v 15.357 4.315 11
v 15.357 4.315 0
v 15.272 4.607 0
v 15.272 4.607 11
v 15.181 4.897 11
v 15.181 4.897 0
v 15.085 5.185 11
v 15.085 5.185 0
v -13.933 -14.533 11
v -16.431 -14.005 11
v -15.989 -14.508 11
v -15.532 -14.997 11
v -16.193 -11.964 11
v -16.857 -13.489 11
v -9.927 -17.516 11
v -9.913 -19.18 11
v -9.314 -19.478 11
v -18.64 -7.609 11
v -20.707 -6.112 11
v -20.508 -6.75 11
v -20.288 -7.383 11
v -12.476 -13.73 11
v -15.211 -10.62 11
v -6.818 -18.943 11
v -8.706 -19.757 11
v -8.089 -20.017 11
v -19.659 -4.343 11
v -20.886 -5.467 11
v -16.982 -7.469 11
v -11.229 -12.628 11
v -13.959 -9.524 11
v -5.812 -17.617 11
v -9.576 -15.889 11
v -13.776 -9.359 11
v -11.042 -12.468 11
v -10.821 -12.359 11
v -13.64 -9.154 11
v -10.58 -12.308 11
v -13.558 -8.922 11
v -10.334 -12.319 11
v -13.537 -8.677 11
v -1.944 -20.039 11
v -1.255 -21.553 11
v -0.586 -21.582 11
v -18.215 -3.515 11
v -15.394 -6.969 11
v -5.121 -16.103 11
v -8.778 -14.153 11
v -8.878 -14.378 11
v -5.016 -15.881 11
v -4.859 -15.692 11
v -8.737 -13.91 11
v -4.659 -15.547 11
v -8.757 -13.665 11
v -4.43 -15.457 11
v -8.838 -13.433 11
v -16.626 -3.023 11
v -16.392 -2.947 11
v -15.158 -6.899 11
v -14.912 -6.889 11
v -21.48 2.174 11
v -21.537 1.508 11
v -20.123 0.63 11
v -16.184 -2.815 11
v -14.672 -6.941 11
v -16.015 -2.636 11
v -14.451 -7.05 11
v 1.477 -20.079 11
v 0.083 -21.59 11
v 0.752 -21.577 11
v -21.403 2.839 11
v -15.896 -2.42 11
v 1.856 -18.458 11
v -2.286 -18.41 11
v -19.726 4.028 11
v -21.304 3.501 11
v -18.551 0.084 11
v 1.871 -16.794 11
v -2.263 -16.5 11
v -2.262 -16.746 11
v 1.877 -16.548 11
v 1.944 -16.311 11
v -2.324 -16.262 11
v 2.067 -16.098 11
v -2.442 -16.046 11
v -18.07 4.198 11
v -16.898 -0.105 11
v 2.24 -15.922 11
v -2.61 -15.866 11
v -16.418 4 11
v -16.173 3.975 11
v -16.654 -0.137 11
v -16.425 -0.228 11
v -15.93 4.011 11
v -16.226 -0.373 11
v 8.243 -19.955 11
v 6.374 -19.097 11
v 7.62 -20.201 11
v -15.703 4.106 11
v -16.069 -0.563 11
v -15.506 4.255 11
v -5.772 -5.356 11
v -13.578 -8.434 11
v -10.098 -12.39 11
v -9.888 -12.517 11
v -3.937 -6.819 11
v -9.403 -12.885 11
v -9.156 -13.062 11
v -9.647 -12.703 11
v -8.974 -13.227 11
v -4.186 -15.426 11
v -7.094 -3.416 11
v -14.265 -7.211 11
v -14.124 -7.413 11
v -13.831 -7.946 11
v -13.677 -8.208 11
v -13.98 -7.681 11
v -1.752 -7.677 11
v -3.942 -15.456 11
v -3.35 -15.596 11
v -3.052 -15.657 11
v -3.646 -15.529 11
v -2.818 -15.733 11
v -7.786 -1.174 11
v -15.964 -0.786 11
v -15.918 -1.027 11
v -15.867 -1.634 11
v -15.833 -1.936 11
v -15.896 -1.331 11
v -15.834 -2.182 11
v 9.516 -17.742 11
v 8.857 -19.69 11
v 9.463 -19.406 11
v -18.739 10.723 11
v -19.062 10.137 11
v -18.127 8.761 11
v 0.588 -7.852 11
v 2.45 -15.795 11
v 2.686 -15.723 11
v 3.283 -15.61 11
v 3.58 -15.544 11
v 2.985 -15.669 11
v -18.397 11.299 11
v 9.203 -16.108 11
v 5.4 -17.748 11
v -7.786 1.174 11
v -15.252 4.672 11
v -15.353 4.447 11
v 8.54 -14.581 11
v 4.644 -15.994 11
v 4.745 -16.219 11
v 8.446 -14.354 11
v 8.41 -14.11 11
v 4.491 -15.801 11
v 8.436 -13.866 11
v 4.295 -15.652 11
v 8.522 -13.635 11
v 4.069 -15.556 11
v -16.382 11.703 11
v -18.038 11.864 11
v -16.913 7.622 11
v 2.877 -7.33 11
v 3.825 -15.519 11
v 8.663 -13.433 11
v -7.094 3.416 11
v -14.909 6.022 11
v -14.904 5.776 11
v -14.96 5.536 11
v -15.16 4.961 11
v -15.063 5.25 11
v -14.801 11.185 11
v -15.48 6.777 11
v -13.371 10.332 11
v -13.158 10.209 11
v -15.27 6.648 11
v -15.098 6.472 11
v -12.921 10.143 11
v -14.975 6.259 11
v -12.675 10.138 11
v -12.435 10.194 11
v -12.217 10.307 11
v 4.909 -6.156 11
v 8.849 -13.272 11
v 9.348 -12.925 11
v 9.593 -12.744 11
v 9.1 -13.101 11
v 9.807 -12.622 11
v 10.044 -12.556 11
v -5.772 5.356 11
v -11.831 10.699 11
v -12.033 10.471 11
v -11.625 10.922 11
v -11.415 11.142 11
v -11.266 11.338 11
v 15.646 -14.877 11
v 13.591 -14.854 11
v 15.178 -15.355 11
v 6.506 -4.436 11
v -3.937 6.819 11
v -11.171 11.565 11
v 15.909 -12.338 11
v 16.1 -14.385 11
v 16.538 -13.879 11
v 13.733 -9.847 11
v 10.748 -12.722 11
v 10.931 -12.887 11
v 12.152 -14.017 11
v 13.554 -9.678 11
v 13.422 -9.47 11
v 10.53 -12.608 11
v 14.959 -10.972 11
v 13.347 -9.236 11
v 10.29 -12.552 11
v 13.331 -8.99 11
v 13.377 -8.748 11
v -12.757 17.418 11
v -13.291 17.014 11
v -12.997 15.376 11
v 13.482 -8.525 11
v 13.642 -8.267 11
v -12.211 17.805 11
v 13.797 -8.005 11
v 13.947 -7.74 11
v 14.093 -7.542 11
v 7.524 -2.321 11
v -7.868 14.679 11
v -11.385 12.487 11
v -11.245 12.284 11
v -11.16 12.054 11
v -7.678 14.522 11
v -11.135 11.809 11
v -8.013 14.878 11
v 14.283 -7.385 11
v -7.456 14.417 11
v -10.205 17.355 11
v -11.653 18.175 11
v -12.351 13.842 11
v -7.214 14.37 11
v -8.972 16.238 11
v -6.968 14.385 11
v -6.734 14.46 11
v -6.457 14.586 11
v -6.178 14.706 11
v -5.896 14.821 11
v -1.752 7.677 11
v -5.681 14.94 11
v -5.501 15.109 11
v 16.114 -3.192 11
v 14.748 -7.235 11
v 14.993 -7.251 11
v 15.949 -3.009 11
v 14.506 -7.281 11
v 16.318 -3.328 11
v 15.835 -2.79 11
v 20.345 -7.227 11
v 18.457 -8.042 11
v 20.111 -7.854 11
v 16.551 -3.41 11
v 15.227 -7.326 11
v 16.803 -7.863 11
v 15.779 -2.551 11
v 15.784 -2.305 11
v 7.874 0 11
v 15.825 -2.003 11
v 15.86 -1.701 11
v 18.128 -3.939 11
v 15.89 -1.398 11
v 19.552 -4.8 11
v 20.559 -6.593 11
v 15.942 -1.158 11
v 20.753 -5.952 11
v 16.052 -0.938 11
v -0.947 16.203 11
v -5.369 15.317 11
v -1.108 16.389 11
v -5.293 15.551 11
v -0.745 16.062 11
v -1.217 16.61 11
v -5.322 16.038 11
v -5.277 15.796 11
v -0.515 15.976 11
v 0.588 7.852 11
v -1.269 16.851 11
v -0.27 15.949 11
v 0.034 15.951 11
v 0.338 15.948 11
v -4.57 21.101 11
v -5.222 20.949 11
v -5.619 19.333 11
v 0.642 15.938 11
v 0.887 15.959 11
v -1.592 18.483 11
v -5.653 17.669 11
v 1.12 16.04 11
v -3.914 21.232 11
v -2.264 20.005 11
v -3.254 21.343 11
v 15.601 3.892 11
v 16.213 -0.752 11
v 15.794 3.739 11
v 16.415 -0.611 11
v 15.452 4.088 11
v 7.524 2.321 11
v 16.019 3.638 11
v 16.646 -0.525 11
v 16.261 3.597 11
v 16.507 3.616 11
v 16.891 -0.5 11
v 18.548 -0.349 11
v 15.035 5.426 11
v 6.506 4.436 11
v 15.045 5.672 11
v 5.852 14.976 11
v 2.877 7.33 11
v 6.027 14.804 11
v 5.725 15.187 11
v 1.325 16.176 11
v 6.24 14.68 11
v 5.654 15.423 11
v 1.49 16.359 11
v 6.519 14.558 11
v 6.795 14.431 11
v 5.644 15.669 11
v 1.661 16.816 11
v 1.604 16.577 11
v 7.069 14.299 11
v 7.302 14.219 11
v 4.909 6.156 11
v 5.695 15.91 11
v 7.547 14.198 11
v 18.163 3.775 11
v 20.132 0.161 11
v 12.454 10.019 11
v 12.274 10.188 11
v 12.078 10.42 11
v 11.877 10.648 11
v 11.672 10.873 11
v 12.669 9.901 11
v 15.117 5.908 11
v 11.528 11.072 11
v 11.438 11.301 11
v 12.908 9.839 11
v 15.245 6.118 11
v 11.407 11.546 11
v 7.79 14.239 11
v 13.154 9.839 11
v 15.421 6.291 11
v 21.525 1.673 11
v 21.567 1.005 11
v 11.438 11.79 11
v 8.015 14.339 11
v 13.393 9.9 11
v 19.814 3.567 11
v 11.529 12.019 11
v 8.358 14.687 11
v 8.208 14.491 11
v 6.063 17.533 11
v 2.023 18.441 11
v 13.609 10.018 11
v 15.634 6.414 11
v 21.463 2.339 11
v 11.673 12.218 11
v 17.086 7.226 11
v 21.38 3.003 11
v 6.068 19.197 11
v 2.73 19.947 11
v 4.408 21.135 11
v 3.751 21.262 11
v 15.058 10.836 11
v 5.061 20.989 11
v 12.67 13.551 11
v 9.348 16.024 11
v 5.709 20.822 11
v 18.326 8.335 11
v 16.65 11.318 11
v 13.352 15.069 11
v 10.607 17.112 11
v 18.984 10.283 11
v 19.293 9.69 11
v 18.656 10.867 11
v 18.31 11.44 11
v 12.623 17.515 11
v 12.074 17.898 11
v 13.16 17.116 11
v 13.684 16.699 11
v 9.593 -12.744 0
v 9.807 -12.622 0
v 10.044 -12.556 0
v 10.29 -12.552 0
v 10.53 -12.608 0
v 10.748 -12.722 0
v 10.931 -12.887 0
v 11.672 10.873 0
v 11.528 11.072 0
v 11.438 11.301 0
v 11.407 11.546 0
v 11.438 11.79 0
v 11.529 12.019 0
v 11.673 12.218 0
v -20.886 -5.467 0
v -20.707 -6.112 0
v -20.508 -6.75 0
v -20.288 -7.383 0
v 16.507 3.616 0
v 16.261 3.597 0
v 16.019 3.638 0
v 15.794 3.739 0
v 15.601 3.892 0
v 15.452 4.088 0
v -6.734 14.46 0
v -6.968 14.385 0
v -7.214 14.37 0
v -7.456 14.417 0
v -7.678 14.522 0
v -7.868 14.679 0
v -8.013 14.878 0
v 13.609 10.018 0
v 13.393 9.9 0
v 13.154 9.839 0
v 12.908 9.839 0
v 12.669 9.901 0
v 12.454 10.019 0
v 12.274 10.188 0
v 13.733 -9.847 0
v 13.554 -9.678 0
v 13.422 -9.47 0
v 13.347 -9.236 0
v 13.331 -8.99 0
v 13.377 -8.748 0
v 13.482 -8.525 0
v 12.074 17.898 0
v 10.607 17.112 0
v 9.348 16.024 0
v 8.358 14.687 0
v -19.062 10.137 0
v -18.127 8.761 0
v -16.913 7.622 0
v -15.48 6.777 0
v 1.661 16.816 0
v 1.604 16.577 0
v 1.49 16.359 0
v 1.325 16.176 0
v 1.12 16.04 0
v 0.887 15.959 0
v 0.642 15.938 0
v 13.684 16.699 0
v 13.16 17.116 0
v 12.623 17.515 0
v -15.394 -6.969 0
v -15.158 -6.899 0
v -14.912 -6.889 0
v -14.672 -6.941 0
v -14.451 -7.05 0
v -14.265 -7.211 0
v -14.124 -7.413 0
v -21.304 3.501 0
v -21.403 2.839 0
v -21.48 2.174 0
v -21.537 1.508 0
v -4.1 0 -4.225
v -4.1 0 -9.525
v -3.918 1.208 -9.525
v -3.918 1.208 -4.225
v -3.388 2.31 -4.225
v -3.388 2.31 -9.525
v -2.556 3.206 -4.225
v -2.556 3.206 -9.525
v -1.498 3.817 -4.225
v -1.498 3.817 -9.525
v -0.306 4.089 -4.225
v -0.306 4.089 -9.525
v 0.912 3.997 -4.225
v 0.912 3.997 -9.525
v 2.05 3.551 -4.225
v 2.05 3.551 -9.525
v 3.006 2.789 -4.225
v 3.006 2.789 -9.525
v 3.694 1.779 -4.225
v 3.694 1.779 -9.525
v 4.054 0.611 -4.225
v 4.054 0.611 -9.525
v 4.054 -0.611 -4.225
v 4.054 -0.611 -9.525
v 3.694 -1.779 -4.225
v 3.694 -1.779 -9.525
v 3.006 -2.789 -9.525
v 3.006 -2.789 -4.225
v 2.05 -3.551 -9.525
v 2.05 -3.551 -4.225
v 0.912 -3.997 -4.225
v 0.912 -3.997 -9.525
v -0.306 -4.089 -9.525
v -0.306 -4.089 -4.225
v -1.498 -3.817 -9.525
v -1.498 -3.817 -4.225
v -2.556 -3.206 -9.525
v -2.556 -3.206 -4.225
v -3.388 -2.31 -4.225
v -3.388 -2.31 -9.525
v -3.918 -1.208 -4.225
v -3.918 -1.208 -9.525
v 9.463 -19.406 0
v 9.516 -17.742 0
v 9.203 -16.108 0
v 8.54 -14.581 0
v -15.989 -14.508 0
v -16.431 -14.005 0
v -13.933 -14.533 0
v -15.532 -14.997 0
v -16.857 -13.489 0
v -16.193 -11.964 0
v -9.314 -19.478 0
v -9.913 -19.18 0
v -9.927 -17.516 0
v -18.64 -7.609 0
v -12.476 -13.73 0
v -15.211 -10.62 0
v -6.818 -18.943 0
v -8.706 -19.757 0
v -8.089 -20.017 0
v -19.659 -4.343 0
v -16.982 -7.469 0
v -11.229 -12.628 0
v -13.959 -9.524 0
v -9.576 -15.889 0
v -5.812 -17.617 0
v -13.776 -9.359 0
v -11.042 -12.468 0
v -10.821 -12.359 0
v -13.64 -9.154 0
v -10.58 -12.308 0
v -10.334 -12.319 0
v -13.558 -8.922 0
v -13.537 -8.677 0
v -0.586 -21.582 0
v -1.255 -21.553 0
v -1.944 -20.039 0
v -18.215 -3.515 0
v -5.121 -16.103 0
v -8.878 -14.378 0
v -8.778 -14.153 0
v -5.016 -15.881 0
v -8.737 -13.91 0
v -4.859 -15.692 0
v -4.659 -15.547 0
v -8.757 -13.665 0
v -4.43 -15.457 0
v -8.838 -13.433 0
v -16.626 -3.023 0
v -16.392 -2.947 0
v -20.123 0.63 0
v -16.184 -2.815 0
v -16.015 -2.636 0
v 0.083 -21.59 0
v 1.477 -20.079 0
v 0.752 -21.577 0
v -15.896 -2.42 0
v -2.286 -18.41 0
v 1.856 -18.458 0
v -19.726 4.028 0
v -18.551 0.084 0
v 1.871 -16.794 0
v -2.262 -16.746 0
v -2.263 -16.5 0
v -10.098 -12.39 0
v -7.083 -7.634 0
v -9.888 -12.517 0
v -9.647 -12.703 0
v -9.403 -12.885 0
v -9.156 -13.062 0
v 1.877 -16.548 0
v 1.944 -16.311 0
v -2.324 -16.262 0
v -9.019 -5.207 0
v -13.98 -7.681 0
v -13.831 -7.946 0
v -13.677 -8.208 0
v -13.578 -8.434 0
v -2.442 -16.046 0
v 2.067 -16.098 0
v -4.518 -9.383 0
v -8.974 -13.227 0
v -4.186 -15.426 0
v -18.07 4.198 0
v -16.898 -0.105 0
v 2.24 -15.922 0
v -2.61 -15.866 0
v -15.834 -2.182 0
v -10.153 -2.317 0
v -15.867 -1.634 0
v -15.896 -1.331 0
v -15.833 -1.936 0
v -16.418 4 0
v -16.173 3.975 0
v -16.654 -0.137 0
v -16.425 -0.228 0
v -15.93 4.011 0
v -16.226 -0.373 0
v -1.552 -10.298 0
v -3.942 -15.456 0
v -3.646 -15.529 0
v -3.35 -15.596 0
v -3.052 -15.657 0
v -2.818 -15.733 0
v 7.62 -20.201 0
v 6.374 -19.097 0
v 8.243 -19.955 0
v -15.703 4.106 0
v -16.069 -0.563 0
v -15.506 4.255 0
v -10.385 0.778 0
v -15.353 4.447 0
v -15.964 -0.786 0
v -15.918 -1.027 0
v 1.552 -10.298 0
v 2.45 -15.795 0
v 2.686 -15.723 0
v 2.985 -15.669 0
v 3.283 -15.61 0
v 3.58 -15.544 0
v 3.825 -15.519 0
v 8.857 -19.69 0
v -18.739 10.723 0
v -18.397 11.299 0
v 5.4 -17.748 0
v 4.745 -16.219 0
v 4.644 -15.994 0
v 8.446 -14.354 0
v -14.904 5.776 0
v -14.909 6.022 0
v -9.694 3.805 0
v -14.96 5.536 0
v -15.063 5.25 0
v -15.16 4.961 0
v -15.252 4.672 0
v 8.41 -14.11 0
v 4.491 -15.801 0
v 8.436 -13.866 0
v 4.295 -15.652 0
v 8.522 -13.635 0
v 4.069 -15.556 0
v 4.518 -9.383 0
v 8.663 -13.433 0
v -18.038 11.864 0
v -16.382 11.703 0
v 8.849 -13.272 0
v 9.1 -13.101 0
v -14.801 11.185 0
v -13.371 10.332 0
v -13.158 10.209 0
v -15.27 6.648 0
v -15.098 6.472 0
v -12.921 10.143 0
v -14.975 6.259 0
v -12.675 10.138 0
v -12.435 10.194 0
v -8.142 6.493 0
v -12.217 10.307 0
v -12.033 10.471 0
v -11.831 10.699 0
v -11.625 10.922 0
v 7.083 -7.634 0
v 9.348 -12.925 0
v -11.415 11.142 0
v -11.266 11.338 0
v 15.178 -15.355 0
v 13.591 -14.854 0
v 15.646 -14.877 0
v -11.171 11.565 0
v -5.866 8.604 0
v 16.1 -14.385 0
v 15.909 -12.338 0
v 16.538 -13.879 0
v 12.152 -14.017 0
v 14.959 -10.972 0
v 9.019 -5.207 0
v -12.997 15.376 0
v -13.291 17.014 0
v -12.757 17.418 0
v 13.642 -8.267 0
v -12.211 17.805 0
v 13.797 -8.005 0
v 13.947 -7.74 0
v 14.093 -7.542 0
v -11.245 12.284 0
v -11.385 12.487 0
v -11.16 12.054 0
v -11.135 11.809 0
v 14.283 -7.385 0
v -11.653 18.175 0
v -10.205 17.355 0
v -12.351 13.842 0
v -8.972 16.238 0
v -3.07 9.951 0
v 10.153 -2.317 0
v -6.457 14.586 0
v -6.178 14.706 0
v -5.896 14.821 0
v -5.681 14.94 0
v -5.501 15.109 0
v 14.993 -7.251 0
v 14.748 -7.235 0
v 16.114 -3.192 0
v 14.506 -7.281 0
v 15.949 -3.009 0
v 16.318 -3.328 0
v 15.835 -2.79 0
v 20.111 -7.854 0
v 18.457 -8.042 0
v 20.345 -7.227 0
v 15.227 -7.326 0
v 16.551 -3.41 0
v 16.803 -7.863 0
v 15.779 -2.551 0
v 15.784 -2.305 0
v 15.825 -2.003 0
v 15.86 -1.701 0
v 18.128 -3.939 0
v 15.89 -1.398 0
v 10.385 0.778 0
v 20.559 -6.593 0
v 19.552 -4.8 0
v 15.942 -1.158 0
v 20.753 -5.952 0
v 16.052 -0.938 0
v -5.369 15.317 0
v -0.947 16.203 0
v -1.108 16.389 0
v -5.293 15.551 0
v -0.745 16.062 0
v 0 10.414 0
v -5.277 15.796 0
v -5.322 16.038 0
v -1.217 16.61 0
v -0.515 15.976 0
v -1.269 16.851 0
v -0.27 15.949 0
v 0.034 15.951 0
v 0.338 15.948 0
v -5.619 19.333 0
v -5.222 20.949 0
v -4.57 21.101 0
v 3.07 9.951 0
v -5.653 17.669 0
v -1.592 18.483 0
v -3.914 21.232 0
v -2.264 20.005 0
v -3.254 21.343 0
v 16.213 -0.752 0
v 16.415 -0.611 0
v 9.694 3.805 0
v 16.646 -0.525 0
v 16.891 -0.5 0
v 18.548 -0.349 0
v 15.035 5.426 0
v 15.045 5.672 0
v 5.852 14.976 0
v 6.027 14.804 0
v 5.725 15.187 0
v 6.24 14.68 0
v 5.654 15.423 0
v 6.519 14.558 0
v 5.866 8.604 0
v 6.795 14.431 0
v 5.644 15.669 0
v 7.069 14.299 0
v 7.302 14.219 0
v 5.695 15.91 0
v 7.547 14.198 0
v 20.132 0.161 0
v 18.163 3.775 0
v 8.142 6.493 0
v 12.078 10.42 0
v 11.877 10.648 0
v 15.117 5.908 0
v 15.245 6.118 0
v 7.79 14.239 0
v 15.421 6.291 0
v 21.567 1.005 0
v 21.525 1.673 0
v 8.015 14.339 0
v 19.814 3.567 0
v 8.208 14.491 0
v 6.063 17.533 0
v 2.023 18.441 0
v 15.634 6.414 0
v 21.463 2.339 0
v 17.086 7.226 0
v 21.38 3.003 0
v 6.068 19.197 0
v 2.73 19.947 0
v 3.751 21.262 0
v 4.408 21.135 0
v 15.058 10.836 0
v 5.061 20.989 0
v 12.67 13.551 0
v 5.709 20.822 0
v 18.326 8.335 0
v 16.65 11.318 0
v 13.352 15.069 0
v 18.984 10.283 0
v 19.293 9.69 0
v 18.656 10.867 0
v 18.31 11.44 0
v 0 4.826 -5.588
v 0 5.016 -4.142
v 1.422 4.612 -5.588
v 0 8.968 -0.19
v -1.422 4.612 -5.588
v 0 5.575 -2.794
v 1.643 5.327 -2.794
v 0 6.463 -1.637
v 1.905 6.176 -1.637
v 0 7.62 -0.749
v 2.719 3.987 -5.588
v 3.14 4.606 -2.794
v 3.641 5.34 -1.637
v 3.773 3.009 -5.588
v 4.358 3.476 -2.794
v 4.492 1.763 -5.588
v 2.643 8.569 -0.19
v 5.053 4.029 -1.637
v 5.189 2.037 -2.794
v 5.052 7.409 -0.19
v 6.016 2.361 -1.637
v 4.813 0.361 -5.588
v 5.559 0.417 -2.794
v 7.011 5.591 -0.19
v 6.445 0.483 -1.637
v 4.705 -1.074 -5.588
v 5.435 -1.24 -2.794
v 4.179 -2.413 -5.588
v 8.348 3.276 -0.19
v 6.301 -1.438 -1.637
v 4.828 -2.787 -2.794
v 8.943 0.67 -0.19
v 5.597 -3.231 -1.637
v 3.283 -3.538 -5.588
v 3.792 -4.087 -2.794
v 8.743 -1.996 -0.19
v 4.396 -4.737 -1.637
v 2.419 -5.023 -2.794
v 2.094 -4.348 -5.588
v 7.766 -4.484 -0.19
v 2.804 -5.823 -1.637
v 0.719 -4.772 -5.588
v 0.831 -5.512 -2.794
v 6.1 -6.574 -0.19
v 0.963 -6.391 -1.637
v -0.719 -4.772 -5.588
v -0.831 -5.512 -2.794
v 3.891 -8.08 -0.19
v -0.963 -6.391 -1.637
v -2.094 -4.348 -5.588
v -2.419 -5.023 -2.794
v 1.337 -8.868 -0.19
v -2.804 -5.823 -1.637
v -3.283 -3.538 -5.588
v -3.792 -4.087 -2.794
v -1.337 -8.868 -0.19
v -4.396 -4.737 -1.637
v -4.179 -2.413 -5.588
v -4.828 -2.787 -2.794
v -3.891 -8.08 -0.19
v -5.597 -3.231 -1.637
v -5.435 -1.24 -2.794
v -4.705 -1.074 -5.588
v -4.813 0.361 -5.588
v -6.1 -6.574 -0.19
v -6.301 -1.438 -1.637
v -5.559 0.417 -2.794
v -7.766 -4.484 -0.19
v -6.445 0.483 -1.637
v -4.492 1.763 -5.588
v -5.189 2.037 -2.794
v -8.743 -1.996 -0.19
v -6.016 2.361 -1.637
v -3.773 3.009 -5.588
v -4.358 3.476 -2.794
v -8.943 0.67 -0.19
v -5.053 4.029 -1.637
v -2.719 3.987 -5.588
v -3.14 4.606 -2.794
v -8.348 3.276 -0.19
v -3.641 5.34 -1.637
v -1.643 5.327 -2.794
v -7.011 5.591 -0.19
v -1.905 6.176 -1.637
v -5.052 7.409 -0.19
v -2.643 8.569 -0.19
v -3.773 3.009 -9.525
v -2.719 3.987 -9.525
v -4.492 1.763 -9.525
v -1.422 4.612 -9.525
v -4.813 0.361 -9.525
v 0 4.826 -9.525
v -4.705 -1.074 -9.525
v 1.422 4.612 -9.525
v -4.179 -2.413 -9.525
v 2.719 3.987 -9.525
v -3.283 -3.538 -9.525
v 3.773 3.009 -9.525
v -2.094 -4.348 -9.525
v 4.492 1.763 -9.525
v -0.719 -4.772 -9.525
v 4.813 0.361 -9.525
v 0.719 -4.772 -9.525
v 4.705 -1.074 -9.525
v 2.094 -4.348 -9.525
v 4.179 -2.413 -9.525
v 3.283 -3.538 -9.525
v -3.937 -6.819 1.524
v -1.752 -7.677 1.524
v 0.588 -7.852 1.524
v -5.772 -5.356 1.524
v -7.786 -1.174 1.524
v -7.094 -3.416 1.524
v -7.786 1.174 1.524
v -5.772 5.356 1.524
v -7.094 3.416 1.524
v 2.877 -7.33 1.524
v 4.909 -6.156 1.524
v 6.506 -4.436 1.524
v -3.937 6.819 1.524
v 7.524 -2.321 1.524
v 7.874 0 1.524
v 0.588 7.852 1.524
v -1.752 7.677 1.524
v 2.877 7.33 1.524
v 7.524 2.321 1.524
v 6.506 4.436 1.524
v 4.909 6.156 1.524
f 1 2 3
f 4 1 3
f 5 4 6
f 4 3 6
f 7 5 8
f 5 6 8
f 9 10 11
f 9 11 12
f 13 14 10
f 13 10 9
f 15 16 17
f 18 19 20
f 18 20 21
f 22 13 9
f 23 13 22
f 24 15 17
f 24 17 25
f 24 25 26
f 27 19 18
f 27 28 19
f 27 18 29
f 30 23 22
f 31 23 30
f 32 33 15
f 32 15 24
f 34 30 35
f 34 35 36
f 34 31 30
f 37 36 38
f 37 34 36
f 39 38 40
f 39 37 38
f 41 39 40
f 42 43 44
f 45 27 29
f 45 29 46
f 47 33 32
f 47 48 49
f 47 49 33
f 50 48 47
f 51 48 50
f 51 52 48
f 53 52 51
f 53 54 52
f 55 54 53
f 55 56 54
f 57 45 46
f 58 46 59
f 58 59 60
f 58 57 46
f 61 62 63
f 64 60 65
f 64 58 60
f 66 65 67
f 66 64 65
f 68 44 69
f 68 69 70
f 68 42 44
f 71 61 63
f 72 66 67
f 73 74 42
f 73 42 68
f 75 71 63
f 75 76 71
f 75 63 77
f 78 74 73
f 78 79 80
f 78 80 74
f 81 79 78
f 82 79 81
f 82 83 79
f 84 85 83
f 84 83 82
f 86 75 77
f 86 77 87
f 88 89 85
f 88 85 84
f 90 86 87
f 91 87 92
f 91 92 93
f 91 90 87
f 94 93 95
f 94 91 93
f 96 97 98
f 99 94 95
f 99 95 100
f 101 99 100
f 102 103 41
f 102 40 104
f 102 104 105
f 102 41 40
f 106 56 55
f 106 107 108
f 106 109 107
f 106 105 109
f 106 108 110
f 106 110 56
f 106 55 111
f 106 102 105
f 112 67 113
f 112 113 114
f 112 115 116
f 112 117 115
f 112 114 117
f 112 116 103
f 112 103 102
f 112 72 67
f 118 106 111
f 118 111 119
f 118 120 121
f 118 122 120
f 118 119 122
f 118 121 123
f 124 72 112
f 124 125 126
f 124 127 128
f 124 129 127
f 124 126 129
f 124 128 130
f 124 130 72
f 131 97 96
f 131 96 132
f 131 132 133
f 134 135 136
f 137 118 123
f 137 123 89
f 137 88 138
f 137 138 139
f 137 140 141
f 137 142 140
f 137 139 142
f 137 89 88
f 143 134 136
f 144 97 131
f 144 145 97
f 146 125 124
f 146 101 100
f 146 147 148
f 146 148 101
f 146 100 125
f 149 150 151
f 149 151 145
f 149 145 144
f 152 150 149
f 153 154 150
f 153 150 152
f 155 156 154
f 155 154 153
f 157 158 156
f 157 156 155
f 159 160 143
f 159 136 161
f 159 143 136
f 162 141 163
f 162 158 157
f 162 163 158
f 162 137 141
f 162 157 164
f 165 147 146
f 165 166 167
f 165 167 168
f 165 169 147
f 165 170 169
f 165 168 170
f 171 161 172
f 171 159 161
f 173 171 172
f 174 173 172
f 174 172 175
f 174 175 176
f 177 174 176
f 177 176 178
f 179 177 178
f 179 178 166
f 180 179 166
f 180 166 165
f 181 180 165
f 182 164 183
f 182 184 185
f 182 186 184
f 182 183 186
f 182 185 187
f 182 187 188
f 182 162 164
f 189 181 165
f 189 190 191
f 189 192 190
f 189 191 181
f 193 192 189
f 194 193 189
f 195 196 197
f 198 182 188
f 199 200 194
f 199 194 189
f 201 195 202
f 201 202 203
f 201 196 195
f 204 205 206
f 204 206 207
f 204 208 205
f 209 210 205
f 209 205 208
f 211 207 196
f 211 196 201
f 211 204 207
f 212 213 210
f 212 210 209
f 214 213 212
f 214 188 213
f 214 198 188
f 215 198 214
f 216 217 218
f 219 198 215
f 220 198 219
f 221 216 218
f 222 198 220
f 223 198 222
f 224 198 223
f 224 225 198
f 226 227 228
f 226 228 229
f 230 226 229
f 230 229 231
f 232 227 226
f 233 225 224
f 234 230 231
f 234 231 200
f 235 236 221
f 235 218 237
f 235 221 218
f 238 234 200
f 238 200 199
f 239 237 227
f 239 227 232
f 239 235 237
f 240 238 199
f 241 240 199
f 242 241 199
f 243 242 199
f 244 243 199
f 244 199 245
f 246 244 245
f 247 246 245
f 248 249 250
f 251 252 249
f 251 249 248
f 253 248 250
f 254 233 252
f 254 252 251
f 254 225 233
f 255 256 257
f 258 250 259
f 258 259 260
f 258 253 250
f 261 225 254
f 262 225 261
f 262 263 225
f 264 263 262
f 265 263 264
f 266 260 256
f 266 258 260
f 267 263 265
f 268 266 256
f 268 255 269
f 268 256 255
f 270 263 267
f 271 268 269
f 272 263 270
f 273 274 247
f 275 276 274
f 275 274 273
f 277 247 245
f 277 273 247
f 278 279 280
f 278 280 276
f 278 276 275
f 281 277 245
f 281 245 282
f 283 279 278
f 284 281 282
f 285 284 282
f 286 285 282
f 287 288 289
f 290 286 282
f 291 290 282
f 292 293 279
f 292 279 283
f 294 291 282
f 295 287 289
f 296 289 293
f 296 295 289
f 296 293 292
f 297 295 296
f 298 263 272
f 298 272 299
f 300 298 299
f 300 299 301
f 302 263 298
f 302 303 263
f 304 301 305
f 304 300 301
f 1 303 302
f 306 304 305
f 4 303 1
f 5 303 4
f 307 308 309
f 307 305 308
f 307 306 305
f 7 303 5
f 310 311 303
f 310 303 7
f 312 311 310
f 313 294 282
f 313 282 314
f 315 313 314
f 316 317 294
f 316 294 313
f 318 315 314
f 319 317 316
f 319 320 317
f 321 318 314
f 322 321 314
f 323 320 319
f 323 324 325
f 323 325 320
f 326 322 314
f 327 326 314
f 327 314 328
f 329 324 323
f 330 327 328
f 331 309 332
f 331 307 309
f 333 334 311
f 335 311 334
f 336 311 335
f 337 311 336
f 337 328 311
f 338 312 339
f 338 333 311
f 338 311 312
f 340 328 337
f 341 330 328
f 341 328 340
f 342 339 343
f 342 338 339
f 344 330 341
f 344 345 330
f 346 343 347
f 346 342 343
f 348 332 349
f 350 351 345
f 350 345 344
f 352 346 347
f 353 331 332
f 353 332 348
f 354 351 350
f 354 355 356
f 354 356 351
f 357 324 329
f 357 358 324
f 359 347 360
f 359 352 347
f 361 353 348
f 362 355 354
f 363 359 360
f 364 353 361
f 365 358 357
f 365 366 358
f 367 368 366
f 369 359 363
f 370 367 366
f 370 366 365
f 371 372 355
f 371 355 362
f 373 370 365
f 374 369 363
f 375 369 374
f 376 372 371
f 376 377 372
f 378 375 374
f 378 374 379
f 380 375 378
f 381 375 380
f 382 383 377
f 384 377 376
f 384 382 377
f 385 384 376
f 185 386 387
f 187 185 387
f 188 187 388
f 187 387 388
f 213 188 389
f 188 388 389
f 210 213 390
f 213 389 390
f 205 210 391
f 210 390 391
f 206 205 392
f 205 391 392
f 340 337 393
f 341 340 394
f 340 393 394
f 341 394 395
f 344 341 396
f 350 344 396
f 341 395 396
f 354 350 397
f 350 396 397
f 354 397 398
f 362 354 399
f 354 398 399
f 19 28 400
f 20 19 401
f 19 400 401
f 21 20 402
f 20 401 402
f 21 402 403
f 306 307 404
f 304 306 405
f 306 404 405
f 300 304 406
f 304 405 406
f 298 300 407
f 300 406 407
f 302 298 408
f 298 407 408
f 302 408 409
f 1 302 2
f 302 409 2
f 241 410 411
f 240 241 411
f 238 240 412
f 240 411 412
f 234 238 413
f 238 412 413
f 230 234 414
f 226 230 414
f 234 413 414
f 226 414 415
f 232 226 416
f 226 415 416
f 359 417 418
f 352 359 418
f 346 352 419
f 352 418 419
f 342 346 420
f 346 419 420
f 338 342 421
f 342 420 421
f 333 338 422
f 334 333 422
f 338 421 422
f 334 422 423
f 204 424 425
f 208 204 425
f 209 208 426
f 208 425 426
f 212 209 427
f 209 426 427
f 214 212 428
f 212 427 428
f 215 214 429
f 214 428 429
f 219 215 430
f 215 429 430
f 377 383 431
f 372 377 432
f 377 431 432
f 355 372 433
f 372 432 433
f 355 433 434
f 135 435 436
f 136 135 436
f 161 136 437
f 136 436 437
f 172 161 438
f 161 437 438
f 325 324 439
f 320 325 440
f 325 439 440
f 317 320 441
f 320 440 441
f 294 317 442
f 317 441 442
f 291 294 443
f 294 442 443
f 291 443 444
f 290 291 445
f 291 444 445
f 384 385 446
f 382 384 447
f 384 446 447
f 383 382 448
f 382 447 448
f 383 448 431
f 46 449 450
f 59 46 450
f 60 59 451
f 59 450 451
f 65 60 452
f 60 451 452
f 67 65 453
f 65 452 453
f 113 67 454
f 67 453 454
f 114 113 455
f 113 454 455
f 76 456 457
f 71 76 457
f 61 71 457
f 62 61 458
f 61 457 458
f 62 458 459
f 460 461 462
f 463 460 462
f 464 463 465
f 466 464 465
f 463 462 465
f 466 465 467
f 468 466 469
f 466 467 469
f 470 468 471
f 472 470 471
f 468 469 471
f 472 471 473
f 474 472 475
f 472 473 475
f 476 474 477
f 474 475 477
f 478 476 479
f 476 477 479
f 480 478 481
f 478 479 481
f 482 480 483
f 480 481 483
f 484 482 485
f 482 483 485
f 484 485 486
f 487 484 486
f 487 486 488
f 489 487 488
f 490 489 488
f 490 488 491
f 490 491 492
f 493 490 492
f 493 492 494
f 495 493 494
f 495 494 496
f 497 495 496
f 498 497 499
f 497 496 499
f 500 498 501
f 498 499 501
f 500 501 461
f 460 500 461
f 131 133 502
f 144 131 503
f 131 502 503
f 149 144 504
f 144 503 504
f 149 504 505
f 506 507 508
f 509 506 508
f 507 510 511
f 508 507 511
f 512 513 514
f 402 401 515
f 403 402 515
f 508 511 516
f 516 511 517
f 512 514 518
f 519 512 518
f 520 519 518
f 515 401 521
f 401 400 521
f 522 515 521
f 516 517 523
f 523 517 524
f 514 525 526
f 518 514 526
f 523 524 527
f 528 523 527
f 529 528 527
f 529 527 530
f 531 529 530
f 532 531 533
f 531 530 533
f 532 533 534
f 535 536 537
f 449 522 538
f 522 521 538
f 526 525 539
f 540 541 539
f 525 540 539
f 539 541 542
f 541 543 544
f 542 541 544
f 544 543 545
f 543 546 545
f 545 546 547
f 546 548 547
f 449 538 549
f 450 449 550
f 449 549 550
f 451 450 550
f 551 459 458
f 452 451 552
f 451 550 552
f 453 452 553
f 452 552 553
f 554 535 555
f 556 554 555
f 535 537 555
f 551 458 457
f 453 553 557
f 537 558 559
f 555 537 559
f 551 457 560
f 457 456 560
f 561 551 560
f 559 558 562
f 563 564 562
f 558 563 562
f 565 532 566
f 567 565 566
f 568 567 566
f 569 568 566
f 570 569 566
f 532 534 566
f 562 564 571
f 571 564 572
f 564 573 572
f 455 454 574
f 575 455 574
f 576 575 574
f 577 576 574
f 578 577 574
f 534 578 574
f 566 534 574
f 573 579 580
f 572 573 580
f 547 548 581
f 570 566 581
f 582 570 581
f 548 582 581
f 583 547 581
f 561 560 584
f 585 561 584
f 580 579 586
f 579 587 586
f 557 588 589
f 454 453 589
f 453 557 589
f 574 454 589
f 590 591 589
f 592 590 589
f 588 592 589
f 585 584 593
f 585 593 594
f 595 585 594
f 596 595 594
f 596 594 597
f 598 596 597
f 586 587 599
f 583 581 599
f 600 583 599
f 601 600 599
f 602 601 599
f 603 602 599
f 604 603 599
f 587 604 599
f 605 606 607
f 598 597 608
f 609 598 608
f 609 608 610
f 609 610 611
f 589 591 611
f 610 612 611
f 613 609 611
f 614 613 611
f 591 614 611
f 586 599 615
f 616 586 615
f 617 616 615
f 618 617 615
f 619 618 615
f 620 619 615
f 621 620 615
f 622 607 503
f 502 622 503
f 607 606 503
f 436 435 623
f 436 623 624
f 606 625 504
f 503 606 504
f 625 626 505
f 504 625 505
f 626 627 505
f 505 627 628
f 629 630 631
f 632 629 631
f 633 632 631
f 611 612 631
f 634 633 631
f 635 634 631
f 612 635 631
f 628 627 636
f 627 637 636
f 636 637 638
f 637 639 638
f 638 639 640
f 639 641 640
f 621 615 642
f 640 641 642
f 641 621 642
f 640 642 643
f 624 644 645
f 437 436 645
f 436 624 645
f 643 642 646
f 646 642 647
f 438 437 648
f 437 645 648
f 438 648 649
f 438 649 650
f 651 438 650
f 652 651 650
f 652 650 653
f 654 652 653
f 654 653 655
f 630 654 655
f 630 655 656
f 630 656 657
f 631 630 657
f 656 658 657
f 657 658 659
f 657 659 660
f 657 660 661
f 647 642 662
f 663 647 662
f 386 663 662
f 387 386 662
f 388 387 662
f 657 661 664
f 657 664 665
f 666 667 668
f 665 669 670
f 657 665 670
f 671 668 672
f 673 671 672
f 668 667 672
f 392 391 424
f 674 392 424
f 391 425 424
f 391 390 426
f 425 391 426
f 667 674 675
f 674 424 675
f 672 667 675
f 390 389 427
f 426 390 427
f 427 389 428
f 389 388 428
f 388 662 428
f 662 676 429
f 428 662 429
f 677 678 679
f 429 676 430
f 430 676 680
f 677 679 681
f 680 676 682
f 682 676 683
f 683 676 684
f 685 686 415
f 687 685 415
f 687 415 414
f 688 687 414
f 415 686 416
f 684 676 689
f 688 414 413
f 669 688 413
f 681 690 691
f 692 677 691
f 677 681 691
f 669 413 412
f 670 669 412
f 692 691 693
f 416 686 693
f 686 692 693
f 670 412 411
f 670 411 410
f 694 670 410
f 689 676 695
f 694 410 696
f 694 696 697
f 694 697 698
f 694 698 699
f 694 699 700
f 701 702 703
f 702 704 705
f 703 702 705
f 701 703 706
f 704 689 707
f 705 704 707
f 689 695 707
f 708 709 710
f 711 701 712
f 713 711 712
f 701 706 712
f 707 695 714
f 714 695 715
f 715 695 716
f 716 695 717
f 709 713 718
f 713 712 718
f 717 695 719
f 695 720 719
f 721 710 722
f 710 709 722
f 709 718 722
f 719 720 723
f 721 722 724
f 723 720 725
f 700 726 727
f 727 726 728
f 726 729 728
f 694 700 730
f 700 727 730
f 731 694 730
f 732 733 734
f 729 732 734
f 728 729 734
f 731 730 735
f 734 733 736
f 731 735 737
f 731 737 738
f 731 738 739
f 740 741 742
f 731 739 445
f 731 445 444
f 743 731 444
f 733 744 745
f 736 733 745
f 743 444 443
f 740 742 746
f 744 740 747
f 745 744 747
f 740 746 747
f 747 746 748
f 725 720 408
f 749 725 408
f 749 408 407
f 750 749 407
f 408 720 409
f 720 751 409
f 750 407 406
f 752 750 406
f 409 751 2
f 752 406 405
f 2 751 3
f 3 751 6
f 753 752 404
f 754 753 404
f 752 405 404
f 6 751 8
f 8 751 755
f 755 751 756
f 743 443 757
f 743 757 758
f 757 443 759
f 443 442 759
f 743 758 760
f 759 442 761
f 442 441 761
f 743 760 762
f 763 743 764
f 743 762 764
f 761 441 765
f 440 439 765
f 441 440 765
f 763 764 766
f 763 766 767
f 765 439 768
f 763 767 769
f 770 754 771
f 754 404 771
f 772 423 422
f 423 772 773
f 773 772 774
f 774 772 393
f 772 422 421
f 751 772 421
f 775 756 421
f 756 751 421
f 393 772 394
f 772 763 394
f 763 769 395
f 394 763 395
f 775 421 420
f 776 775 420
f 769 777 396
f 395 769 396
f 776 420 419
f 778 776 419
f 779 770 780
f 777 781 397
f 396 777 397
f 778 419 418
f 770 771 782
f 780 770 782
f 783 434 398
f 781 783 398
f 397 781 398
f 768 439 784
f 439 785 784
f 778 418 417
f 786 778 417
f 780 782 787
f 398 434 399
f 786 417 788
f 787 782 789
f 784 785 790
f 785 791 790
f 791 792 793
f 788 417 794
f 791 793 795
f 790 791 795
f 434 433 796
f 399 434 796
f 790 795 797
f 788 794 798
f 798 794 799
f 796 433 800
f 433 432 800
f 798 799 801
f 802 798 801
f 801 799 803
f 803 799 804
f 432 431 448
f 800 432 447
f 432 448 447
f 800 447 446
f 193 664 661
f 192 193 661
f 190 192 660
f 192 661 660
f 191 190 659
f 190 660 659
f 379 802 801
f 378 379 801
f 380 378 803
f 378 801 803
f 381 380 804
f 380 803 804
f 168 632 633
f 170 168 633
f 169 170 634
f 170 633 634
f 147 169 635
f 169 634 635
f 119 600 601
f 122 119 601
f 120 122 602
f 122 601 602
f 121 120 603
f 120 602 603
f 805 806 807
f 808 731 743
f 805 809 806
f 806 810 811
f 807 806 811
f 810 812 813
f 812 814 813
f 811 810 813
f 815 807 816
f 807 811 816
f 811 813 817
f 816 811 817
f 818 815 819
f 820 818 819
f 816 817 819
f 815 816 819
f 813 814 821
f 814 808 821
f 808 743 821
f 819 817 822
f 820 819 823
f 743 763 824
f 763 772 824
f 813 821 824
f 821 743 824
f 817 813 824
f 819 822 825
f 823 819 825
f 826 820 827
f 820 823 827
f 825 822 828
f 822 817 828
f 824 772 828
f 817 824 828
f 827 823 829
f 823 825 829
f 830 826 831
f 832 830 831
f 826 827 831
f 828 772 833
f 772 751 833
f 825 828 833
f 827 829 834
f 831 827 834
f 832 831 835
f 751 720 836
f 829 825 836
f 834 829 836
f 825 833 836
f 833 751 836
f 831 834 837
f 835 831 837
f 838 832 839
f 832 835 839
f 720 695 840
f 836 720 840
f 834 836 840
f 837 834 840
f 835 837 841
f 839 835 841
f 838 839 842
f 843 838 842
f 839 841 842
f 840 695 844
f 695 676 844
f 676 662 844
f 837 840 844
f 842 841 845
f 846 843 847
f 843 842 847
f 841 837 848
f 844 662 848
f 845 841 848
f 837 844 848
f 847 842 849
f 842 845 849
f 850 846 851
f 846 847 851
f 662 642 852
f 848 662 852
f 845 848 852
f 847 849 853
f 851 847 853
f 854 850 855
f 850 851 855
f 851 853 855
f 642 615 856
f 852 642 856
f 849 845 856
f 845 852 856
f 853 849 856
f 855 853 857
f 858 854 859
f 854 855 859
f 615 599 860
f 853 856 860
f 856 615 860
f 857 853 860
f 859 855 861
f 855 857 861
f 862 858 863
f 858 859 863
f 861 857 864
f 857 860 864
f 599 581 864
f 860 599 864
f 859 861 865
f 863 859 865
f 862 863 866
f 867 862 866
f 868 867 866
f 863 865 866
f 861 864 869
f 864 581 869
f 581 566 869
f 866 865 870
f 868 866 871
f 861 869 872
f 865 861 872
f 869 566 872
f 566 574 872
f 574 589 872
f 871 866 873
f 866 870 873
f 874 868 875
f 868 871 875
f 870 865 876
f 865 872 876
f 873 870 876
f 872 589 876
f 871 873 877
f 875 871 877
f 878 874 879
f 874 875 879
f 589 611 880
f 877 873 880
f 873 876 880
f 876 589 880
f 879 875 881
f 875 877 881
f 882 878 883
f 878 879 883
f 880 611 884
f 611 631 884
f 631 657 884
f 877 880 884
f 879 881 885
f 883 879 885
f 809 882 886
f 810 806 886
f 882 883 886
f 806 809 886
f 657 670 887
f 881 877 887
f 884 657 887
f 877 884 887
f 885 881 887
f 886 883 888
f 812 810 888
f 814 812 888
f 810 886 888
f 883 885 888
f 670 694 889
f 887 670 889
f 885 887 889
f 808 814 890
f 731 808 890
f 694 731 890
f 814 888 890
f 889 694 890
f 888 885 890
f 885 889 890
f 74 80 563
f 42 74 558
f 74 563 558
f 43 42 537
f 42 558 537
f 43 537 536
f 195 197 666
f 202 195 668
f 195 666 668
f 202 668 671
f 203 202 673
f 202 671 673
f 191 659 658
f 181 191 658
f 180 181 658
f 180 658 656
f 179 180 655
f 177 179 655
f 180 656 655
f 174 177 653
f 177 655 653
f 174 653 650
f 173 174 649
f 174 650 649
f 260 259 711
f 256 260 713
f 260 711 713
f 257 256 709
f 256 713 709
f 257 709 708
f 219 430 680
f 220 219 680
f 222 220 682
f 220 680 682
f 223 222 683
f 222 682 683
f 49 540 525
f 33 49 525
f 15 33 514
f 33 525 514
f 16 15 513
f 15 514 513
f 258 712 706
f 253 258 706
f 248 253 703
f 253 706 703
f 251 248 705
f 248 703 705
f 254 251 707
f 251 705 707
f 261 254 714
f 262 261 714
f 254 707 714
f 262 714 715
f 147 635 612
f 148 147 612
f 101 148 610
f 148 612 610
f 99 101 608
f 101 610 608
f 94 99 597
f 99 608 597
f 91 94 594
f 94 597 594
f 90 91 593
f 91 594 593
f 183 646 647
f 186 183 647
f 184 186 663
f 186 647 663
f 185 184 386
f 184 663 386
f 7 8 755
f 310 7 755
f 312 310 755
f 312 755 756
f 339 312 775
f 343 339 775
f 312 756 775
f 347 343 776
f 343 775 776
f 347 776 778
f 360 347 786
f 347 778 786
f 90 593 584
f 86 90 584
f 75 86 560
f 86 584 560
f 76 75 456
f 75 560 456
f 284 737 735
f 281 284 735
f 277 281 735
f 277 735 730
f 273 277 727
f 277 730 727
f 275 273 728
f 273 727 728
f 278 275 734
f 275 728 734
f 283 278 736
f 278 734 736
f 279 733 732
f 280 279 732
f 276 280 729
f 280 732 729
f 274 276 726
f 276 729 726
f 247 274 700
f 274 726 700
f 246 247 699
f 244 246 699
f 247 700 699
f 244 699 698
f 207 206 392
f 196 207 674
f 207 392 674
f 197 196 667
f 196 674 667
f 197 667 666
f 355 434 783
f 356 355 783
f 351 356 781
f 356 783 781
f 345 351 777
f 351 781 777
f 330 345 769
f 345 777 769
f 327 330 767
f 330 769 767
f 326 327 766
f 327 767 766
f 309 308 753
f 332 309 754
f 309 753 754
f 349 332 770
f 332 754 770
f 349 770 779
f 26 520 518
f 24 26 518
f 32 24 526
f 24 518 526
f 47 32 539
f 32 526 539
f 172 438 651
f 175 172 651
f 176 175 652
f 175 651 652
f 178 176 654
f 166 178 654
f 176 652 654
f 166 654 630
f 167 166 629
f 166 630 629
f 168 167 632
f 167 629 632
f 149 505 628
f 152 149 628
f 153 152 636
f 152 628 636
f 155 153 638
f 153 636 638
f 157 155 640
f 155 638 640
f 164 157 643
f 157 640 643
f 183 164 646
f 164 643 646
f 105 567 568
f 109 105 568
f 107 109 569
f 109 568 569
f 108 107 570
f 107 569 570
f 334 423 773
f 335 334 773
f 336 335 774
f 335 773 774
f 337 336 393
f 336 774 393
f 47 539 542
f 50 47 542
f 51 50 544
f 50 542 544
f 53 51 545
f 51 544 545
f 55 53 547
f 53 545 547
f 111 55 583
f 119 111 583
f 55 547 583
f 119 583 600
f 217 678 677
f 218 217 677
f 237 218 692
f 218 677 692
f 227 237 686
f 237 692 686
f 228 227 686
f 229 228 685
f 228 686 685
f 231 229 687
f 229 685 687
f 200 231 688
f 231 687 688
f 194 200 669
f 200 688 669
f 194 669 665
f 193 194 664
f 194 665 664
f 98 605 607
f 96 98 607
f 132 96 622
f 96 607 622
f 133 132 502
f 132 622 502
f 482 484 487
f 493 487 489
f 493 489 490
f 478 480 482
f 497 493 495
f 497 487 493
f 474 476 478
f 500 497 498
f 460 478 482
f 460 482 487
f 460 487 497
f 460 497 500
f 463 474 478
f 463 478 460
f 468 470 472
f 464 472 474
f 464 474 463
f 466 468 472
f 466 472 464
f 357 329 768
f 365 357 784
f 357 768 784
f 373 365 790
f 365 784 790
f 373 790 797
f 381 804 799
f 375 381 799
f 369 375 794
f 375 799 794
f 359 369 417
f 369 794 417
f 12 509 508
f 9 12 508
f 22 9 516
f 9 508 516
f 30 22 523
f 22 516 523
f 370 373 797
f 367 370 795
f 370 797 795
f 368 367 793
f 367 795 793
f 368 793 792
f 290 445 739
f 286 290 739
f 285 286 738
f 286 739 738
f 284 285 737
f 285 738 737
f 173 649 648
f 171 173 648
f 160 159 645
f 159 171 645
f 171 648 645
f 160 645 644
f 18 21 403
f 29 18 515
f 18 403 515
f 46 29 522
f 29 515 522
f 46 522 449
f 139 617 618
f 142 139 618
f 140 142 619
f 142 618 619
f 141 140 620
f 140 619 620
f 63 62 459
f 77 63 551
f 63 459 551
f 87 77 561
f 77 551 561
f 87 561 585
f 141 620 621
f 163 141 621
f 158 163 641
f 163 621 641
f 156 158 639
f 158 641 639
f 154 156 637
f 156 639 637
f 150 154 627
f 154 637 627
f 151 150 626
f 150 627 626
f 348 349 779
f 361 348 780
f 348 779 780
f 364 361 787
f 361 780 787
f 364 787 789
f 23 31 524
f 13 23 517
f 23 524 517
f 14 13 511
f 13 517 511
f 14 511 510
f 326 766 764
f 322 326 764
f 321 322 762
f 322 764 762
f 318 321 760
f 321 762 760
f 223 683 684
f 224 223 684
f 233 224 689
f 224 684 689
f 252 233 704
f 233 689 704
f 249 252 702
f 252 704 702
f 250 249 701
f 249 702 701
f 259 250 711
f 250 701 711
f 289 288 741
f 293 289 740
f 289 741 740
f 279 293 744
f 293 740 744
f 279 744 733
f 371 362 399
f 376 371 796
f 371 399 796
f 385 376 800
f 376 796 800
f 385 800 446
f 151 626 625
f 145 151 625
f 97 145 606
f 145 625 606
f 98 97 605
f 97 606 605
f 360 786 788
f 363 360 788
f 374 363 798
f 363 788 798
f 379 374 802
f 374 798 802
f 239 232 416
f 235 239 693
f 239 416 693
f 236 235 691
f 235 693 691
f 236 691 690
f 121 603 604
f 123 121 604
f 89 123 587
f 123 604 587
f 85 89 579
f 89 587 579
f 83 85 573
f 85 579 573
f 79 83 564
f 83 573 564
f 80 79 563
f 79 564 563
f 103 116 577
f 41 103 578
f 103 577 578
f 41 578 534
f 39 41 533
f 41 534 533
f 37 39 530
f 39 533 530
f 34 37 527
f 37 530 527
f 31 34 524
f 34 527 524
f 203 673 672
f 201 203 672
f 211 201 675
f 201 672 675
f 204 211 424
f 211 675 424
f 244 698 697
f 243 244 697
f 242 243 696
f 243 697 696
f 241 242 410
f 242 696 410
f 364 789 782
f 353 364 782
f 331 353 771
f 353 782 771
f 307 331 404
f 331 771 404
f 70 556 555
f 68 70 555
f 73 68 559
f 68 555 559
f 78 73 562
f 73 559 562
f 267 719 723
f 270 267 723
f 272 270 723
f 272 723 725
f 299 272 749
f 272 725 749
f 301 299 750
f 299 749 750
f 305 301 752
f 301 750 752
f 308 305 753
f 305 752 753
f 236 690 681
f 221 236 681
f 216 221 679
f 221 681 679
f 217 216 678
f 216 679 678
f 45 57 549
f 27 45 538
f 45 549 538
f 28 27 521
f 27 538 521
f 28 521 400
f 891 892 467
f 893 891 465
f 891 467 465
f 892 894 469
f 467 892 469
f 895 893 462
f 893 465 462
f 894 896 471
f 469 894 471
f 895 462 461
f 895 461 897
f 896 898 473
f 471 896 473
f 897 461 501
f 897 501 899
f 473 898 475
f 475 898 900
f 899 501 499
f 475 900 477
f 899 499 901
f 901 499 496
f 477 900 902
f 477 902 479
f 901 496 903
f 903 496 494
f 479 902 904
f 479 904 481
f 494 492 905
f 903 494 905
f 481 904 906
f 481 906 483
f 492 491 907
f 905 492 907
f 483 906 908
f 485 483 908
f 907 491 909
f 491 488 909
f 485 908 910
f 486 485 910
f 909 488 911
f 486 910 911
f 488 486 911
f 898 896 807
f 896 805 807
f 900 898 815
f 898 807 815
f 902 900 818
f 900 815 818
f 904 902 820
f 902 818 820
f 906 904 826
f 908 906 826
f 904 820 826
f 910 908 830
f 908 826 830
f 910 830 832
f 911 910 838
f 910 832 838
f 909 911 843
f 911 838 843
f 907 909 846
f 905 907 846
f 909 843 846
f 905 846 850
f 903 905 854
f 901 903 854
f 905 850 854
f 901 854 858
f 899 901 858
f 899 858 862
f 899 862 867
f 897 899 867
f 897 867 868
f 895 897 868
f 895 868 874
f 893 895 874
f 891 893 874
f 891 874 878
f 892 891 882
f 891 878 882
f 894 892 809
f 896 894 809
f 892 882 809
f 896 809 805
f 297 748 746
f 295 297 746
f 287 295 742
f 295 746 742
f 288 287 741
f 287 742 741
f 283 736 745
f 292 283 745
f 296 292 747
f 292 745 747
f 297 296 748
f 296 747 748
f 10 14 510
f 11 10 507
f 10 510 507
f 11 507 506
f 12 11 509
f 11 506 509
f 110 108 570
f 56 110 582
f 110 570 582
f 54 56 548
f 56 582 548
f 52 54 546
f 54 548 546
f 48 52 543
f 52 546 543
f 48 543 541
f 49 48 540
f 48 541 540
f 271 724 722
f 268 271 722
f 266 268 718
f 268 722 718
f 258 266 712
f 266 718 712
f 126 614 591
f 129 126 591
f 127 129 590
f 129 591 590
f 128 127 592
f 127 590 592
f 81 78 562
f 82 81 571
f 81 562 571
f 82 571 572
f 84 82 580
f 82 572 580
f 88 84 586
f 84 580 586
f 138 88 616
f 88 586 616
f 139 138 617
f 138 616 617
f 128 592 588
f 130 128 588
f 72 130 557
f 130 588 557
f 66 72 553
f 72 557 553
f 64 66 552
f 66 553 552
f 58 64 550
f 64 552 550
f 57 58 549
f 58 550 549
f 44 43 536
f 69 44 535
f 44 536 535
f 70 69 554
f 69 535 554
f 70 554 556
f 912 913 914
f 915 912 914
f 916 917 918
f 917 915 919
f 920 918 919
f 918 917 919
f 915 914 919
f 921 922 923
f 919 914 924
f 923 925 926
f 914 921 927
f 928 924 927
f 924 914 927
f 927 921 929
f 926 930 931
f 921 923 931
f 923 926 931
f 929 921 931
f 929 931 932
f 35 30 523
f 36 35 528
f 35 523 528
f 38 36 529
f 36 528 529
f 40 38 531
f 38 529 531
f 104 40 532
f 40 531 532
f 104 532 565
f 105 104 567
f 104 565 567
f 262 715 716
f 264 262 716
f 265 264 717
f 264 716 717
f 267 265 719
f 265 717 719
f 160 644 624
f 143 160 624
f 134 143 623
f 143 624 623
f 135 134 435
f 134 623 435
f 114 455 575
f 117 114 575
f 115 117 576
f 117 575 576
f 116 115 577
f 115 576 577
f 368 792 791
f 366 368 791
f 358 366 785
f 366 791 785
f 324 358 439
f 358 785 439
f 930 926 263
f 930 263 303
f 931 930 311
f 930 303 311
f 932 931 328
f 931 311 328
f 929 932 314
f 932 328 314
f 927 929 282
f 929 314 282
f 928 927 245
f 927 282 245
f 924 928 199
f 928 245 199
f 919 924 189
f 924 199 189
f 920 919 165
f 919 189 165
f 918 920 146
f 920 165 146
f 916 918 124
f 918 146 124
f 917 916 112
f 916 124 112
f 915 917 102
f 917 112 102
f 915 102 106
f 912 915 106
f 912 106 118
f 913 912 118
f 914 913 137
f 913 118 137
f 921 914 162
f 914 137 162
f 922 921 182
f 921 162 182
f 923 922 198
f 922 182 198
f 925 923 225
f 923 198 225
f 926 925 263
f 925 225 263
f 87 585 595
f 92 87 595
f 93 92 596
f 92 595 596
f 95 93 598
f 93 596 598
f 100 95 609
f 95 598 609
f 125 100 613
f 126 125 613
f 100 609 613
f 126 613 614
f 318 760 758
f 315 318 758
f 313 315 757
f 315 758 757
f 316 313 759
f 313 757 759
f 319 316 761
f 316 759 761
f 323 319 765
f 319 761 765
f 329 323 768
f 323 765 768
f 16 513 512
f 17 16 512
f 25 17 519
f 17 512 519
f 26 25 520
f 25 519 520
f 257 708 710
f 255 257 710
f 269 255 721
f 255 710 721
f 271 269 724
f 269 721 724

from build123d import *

# Parameters (mm, degrees)
SKETCH3_R          = 21.59
GEARBODY_DEPTH     = 11
TOOTHCUT_DEPTH     = 12
CIRPATTERN1_COUNT  = 15
BOREDIA_R          = 7.874
BORE_DEPTH         = 12700
SKETCH6_R          = 4.1
CUT_EXTRUDE1_DEPTH = 5.3


with BuildPart() as part:
    # Sketch3 → gearBody (new body)
    with BuildSketch(Plane.XY):
        Circle(SKETCH3_R)
    extrude(amount=GEARBODY_DEPTH)

    # Sketch2 → toothCut (cut, through all)
    with BuildSketch(Plane.XY):
        with BuildLine():
            ThreePointArc((15.783846764, -2.304552616), (15.843293638, -1.852249483), (15.889781974, -1.39843136))
            ThreePointArc((15.889781974, -1.39843136), (16.213055843, -0.751556907), (16.890861518, -0.499501321))
            ThreePointArc((16.890861518, -0.499501321), (20.504912911, 0.340315353), (23.283949955, 2.798691365))
            ThreePointArc((23.283949955, 2.798691365), (23.292901215, -2.723187818), (22.010467945, -8.09409042))
            ThreePointArc((22.010467945, -8.09409042), (19.873444675, -5.060974685), (16.550574786, -3.410158156))
            ThreePointArc((16.550574786, -3.410158156), (15.949189176, -3.008551507), (15.783846764, -2.304552616))
        make_face()
    toothcut = extrude(amount=TOOTHCUT_DEPTH, mode=Mode.SUBTRACT)

    # CirPattern1: toothCut ×15 about axis
    cirpattern1_axis = Axis((0, 0, 0), (0, 0, 1))
    for i in range(1, CIRPATTERN1_COUNT):
        add(toothcut.rotate(cirpattern1_axis, i * 360 / CIRPATTERN1_COUNT), mode=Mode.SUBTRACT)

    # boreDia → bore (cut, symmetric)
    with BuildSketch(Plane.XY):
        Circle(BOREDIA_R)
    extrude(amount=BORE_DEPTH, both=True, mode=Mode.SUBTRACT)

    # Sketch4 → Revolve1 (revolve)
    with BuildSketch(Plane(origin=(0, 0, 0), x_dir=(0, 0, -1), z_dir=(1, 0, 0))):
        with BuildLine():
            Line((0, 0), (9.525, 0))
            Line((9.525, 0), (9.525, 4.826))
            Line((9.525, 4.826), (5.588, 4.826))
            ThreePointArc((5.588, 4.826), (1.636687307, 6.462687307), (0, 10.414))
            Line((0, 10.414), (0, 7.874))
            Line((0, 7.874), (-1.524, 7.874))
            Line((-1.524, 7.874), (-1.524, 0))
            Line((-1.524, 0), (0, 0))
        make_face()
    revolve(axis=Axis((0, 0, 0), (0, 0, -1)))

    # Sketch6 → Cut-Extrude1 (cut)
    with BuildSketch(Plane(origin=(0, 0, -9.525), x_dir=(-1, 0, 0), z_dir=(0, 0, -1))):
        Circle(SKETCH6_R)
    extrude(amount=-CUT_EXTRUDE1_DEPTH, mode=Mode.SUBTRACT)


solid = part.part
